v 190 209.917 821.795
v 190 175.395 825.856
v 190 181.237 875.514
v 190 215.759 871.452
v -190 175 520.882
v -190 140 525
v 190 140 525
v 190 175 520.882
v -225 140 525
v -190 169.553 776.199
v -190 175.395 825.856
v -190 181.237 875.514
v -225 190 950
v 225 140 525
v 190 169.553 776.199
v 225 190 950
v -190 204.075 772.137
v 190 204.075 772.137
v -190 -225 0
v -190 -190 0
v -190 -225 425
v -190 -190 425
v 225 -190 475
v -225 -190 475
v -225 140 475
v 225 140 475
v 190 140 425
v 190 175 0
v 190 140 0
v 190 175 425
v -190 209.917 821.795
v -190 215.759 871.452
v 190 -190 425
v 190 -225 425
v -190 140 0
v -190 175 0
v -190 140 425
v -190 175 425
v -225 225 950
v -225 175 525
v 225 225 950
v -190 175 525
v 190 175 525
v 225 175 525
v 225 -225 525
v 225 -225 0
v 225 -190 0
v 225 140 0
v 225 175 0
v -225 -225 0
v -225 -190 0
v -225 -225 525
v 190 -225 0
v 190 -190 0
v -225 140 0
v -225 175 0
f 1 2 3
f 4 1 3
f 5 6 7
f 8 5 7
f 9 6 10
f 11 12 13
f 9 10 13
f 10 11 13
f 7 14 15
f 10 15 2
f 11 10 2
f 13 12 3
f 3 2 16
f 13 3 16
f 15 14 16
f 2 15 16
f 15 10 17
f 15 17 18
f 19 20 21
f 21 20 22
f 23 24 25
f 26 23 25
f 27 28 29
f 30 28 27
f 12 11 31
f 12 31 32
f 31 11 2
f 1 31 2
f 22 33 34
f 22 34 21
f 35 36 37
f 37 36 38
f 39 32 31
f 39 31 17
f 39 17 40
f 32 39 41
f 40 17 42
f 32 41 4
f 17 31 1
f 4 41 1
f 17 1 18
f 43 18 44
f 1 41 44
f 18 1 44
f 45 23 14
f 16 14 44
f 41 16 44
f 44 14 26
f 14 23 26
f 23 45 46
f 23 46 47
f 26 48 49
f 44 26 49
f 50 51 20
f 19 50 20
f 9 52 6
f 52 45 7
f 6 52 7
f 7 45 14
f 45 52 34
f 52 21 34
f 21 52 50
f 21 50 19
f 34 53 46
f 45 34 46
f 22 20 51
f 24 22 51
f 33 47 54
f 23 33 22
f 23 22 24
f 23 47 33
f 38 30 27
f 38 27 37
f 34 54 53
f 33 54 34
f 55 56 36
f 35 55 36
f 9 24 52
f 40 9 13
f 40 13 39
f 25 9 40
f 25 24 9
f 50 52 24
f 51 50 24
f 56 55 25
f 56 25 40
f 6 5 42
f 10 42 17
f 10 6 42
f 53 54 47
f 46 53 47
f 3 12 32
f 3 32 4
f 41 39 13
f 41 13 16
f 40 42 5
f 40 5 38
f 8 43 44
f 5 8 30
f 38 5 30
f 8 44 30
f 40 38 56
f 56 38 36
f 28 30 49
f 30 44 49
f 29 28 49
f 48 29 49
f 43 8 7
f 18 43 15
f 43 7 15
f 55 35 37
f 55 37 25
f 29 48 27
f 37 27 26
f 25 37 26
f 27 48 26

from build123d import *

# Parameters (mm, degrees)
F0_W     = 450
F0_H     = 450
F1_DEPTH = 950
F2_W     = 50
F2_H     = 50
F2_W_2   = 330
F2_H_2   = 475
F3_DEPTH = 450.001
F4_W     = 380
F4_H     = 425
F5_DEPTH = 400.001
F6_W     = 380
F6_H     = 50
F6_H_2   = 252.931069
F7_DEPTH = 145.760456


with BuildPart() as f1:
    # F0 (on Top) → F1 (new body)
    with BuildSketch(Plane.XY):
        Rectangle(F0_W, F0_H)
    extrude(amount=F1_DEPTH)

    # F2 (on face) → F3 (cut, through all)
    with BuildSketch(Plane.YZ.offset(225)):
        with Locations((200, 500)):
            Rectangle(F2_W, F2_H)
        with Locations((-25, 237.5)):
            Rectangle(F2_W_2, F2_H_2)
        with Locations((200, 237.5)):
            Rectangle(F2_W, F2_H_2)
        Polygon((225, 950), (175, 525), (225, 525), align=None)
        Polygon((-225, 950), (-225, 525), (140, 525), (190, 950), align=None)
    extrude(amount=-F3_DEPTH, mode=Mode.SUBTRACT)

    # F4 (on face) → F5 (cut, through all)
    with BuildSketch(Plane(origin=(0, 175, 0), x_dir=(-1, 0, 0), z_dir=(0, 1, 0))):
        with Locations((0, 212.5)):
            Rectangle(F4_W, F4_H)
    extrude(amount=-F5_DEPTH, mode=Mode.SUBTRACT)

    # F6 (on face) → F7 (cut, through all)
    with BuildSketch(Plane(origin=(0, 77.167235, -9.078498), x_dir=(1, 0, 0), z_dir=(0, -0.993151, 0.116841))):
        with Locations((0, 865.692911)):
            Rectangle(F6_W, F6_H)
        with Locations((0, 664.227376)):
            Rectangle(F6_W, F6_H_2)
    extrude(amount=-F7_DEPTH, mode=Mode.SUBTRACT)


solid = f1.part
